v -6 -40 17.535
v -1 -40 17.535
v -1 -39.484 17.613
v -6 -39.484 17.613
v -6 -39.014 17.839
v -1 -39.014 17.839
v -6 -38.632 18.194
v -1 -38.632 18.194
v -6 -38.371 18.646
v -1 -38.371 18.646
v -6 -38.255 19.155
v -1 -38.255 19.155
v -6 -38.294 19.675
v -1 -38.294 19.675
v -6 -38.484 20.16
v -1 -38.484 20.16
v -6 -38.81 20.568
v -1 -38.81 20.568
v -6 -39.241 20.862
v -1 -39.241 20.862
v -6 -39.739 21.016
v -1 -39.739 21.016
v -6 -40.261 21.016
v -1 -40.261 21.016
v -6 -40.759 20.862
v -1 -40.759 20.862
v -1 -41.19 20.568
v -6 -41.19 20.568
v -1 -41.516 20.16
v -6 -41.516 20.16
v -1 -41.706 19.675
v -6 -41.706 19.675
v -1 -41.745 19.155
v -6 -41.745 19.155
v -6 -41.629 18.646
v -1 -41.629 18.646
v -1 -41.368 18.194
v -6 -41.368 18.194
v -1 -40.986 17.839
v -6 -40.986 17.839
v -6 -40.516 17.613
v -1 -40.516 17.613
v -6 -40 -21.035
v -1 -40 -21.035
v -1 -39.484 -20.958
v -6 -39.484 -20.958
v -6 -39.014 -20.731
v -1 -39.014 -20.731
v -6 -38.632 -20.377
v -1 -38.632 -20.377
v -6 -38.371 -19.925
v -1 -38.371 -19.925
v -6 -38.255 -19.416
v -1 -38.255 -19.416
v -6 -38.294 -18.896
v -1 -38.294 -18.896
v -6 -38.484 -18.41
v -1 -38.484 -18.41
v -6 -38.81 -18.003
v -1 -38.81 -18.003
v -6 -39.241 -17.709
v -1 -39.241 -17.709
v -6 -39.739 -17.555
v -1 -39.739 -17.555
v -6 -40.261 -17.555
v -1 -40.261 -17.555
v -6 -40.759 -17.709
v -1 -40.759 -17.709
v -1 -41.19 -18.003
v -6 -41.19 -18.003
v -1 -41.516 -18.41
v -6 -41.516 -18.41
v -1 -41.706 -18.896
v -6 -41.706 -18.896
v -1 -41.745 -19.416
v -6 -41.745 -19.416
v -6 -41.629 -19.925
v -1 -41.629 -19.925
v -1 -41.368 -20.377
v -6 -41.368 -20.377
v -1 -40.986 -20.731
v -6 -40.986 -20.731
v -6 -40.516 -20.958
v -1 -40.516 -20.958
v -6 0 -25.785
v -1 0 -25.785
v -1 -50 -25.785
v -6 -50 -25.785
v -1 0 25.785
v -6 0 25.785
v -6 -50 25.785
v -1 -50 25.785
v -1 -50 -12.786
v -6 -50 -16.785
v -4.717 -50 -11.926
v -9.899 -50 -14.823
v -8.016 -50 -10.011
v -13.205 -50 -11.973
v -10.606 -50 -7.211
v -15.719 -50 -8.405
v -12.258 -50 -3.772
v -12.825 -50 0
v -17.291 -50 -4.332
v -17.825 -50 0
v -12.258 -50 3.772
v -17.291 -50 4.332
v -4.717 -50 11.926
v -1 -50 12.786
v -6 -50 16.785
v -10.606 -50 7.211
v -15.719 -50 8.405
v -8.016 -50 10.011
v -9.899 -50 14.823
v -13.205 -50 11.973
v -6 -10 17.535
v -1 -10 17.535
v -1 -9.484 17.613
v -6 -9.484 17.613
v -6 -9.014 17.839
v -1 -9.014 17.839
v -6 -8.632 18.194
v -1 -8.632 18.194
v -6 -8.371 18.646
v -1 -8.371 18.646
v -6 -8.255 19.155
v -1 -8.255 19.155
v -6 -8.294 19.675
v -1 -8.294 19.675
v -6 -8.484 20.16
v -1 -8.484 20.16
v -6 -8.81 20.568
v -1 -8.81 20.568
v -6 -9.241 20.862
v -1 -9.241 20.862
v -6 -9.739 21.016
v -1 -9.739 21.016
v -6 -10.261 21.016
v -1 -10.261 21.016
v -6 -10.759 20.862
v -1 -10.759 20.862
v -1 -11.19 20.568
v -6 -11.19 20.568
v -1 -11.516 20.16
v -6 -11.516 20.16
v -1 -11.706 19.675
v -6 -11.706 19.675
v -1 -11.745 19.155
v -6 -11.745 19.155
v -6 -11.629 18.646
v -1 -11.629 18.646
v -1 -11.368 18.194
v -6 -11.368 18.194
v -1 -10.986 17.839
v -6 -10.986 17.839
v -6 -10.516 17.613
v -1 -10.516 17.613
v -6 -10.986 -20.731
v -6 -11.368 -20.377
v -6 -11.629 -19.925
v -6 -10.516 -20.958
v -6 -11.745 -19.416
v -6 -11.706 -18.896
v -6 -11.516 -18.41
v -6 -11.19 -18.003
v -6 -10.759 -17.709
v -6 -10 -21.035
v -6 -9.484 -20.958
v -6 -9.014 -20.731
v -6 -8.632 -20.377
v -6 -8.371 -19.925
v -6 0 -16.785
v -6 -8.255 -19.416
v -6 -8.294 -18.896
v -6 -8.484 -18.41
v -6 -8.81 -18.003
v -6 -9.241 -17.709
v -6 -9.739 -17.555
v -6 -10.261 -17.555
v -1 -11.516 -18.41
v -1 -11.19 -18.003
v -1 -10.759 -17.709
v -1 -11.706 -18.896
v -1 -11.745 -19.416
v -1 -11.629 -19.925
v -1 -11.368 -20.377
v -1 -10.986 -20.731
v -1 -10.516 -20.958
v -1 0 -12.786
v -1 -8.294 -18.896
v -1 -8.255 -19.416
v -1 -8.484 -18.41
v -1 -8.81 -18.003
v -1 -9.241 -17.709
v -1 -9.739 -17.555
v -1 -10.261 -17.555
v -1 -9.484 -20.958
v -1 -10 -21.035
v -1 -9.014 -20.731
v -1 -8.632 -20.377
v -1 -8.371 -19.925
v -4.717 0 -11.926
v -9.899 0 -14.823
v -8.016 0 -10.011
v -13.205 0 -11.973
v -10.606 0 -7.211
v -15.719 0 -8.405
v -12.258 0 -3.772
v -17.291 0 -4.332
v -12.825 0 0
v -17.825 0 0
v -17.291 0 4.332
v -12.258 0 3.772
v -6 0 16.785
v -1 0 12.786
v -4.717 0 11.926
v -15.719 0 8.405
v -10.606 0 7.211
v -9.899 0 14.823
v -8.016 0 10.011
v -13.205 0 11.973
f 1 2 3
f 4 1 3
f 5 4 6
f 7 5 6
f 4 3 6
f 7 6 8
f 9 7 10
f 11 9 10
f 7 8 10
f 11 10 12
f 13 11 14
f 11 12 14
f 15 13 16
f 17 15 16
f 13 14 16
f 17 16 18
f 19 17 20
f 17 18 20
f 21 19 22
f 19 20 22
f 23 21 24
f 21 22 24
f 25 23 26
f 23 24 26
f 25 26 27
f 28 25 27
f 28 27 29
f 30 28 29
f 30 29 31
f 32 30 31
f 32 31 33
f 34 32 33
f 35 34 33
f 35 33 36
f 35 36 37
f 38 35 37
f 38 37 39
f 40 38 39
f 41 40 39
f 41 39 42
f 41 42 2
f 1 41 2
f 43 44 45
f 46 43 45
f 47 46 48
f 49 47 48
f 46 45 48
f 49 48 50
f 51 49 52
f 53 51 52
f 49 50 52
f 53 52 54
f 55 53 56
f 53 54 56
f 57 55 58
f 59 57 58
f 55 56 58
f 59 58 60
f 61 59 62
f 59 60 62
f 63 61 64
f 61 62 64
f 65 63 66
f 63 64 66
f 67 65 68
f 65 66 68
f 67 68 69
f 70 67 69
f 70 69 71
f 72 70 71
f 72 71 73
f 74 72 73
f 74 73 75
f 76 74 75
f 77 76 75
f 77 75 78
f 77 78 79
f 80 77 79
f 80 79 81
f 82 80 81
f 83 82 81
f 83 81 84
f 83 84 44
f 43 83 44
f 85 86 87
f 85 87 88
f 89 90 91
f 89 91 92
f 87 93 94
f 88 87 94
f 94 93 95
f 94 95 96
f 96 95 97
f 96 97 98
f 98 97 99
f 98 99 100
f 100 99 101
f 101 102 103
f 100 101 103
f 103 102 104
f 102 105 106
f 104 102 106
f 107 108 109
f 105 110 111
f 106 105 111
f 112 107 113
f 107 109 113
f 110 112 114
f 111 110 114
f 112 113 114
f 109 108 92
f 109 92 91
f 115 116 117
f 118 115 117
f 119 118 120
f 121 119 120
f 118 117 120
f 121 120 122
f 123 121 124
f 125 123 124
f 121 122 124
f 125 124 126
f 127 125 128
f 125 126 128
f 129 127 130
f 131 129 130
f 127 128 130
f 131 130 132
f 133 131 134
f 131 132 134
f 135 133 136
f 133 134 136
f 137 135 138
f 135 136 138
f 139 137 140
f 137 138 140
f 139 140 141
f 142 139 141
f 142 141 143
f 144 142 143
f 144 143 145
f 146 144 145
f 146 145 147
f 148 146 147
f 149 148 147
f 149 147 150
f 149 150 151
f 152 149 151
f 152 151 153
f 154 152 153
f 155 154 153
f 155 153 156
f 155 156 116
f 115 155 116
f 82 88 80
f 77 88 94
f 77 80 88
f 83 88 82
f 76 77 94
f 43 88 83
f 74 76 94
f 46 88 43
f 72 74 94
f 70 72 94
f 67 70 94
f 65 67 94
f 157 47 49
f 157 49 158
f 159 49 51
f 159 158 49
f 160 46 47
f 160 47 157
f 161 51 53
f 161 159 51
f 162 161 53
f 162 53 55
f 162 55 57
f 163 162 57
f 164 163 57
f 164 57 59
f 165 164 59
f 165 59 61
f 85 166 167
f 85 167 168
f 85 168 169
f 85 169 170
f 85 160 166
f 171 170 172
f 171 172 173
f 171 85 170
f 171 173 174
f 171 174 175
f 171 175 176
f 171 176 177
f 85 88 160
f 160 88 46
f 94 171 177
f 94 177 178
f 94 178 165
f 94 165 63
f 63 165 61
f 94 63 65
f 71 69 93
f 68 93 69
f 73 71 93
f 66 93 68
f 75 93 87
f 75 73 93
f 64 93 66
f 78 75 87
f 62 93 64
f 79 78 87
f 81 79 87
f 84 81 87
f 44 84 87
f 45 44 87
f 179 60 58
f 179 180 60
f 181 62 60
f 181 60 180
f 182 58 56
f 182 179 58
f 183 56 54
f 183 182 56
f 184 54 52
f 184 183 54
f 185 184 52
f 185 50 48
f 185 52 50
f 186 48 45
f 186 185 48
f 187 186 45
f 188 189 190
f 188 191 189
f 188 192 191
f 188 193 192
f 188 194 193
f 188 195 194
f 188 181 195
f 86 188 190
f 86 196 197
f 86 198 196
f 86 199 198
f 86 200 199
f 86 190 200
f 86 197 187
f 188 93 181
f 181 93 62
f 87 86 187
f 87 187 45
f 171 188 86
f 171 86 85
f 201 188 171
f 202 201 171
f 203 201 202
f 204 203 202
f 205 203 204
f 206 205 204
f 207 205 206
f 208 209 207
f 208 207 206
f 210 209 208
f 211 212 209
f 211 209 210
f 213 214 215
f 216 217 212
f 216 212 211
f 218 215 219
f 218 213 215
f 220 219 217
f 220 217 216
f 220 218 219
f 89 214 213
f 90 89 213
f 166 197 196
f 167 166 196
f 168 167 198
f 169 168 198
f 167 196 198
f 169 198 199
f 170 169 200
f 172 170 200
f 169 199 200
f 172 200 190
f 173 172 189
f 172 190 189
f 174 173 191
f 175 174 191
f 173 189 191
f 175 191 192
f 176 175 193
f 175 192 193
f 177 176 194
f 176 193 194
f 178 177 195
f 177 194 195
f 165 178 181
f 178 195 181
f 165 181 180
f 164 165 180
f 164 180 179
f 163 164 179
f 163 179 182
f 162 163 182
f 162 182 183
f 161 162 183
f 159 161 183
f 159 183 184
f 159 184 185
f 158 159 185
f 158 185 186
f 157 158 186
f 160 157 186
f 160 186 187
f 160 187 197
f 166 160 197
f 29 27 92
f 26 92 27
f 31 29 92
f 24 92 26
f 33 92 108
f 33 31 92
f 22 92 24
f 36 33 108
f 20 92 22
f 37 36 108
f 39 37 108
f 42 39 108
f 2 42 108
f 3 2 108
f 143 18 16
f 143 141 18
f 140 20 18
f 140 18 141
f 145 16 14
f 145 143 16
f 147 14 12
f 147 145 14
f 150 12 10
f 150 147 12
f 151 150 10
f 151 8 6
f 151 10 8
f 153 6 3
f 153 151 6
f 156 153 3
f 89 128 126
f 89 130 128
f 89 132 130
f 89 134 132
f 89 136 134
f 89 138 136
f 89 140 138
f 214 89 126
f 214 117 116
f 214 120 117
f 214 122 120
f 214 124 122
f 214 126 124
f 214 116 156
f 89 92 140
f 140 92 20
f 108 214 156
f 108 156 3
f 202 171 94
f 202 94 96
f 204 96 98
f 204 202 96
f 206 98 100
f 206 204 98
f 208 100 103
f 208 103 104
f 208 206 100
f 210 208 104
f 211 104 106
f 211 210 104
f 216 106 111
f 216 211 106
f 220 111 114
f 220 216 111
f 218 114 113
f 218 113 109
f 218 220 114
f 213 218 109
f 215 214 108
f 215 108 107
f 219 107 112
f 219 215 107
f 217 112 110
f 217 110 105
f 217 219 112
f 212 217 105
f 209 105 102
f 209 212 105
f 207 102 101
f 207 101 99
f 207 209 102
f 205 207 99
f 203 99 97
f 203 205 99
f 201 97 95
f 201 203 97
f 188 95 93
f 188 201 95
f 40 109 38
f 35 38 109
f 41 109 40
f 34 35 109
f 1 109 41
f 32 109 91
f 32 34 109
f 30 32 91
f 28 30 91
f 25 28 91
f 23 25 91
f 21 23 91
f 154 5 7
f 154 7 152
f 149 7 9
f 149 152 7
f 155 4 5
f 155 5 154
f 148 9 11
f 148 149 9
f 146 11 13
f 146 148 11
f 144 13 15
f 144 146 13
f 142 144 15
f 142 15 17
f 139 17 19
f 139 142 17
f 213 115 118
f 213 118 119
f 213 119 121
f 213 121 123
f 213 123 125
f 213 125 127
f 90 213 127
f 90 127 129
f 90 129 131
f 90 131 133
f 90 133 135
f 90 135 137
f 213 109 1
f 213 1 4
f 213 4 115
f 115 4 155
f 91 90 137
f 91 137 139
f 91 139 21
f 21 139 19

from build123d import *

# Parameters (mm, degrees)
BOSS_EXTRUDE4_DEPTH = 50
SKETCH7_R           = 1.75
CUT_EXTRUDE1_DEPTH  = 17.825


with BuildPart() as part:
    # Sketch6 → Boss-Extrude4 (new body)
    with BuildSketch(Plane.XZ):
        with BuildLine():
            Line((-1, 25.784833184), (-1, 12.785954208))
            ThreePointArc((-1, 12.785954208), (-12.825, 0), (-1, -12.785954208))
            Line((-1, -12.785954208), (-1, -25.784833184))
            Line((-1, -25.784833184), (-6, -25.784833184))
            Line((-6, -25.784833184), (-6, -16.784833184))
            ThreePointArc((-6, -16.784833184), (-17.825, 0), (-6, 16.784833184))
            Line((-6, 16.784833184), (-6, 25.784833184))
            Line((-6, 25.784833184), (-1, 25.784833184))
        make_face()
    extrude(amount=BOSS_EXTRUDE4_DEPTH)

    # Sketch7 → Cut-Extrude1 (cut, through all)
    with BuildSketch(Plane(origin=(-1, 0, 0), x_dir=(0, 0, -1), z_dir=(1, 0, 0))):
        with Locations((-19.285393696, -10)):
            Circle(SKETCH7_R)
        with Locations((-19.285393696, -40)):
            Circle(SKETCH7_R)
        with Locations((19.285393696, -40)):
            Circle(SKETCH7_R)
        with Locations((19.285393696, -10)):
            Circle(SKETCH7_R)
    extrude(amount=-CUT_EXTRUDE1_DEPTH, mode=Mode.SUBTRACT)


solid = part.part
